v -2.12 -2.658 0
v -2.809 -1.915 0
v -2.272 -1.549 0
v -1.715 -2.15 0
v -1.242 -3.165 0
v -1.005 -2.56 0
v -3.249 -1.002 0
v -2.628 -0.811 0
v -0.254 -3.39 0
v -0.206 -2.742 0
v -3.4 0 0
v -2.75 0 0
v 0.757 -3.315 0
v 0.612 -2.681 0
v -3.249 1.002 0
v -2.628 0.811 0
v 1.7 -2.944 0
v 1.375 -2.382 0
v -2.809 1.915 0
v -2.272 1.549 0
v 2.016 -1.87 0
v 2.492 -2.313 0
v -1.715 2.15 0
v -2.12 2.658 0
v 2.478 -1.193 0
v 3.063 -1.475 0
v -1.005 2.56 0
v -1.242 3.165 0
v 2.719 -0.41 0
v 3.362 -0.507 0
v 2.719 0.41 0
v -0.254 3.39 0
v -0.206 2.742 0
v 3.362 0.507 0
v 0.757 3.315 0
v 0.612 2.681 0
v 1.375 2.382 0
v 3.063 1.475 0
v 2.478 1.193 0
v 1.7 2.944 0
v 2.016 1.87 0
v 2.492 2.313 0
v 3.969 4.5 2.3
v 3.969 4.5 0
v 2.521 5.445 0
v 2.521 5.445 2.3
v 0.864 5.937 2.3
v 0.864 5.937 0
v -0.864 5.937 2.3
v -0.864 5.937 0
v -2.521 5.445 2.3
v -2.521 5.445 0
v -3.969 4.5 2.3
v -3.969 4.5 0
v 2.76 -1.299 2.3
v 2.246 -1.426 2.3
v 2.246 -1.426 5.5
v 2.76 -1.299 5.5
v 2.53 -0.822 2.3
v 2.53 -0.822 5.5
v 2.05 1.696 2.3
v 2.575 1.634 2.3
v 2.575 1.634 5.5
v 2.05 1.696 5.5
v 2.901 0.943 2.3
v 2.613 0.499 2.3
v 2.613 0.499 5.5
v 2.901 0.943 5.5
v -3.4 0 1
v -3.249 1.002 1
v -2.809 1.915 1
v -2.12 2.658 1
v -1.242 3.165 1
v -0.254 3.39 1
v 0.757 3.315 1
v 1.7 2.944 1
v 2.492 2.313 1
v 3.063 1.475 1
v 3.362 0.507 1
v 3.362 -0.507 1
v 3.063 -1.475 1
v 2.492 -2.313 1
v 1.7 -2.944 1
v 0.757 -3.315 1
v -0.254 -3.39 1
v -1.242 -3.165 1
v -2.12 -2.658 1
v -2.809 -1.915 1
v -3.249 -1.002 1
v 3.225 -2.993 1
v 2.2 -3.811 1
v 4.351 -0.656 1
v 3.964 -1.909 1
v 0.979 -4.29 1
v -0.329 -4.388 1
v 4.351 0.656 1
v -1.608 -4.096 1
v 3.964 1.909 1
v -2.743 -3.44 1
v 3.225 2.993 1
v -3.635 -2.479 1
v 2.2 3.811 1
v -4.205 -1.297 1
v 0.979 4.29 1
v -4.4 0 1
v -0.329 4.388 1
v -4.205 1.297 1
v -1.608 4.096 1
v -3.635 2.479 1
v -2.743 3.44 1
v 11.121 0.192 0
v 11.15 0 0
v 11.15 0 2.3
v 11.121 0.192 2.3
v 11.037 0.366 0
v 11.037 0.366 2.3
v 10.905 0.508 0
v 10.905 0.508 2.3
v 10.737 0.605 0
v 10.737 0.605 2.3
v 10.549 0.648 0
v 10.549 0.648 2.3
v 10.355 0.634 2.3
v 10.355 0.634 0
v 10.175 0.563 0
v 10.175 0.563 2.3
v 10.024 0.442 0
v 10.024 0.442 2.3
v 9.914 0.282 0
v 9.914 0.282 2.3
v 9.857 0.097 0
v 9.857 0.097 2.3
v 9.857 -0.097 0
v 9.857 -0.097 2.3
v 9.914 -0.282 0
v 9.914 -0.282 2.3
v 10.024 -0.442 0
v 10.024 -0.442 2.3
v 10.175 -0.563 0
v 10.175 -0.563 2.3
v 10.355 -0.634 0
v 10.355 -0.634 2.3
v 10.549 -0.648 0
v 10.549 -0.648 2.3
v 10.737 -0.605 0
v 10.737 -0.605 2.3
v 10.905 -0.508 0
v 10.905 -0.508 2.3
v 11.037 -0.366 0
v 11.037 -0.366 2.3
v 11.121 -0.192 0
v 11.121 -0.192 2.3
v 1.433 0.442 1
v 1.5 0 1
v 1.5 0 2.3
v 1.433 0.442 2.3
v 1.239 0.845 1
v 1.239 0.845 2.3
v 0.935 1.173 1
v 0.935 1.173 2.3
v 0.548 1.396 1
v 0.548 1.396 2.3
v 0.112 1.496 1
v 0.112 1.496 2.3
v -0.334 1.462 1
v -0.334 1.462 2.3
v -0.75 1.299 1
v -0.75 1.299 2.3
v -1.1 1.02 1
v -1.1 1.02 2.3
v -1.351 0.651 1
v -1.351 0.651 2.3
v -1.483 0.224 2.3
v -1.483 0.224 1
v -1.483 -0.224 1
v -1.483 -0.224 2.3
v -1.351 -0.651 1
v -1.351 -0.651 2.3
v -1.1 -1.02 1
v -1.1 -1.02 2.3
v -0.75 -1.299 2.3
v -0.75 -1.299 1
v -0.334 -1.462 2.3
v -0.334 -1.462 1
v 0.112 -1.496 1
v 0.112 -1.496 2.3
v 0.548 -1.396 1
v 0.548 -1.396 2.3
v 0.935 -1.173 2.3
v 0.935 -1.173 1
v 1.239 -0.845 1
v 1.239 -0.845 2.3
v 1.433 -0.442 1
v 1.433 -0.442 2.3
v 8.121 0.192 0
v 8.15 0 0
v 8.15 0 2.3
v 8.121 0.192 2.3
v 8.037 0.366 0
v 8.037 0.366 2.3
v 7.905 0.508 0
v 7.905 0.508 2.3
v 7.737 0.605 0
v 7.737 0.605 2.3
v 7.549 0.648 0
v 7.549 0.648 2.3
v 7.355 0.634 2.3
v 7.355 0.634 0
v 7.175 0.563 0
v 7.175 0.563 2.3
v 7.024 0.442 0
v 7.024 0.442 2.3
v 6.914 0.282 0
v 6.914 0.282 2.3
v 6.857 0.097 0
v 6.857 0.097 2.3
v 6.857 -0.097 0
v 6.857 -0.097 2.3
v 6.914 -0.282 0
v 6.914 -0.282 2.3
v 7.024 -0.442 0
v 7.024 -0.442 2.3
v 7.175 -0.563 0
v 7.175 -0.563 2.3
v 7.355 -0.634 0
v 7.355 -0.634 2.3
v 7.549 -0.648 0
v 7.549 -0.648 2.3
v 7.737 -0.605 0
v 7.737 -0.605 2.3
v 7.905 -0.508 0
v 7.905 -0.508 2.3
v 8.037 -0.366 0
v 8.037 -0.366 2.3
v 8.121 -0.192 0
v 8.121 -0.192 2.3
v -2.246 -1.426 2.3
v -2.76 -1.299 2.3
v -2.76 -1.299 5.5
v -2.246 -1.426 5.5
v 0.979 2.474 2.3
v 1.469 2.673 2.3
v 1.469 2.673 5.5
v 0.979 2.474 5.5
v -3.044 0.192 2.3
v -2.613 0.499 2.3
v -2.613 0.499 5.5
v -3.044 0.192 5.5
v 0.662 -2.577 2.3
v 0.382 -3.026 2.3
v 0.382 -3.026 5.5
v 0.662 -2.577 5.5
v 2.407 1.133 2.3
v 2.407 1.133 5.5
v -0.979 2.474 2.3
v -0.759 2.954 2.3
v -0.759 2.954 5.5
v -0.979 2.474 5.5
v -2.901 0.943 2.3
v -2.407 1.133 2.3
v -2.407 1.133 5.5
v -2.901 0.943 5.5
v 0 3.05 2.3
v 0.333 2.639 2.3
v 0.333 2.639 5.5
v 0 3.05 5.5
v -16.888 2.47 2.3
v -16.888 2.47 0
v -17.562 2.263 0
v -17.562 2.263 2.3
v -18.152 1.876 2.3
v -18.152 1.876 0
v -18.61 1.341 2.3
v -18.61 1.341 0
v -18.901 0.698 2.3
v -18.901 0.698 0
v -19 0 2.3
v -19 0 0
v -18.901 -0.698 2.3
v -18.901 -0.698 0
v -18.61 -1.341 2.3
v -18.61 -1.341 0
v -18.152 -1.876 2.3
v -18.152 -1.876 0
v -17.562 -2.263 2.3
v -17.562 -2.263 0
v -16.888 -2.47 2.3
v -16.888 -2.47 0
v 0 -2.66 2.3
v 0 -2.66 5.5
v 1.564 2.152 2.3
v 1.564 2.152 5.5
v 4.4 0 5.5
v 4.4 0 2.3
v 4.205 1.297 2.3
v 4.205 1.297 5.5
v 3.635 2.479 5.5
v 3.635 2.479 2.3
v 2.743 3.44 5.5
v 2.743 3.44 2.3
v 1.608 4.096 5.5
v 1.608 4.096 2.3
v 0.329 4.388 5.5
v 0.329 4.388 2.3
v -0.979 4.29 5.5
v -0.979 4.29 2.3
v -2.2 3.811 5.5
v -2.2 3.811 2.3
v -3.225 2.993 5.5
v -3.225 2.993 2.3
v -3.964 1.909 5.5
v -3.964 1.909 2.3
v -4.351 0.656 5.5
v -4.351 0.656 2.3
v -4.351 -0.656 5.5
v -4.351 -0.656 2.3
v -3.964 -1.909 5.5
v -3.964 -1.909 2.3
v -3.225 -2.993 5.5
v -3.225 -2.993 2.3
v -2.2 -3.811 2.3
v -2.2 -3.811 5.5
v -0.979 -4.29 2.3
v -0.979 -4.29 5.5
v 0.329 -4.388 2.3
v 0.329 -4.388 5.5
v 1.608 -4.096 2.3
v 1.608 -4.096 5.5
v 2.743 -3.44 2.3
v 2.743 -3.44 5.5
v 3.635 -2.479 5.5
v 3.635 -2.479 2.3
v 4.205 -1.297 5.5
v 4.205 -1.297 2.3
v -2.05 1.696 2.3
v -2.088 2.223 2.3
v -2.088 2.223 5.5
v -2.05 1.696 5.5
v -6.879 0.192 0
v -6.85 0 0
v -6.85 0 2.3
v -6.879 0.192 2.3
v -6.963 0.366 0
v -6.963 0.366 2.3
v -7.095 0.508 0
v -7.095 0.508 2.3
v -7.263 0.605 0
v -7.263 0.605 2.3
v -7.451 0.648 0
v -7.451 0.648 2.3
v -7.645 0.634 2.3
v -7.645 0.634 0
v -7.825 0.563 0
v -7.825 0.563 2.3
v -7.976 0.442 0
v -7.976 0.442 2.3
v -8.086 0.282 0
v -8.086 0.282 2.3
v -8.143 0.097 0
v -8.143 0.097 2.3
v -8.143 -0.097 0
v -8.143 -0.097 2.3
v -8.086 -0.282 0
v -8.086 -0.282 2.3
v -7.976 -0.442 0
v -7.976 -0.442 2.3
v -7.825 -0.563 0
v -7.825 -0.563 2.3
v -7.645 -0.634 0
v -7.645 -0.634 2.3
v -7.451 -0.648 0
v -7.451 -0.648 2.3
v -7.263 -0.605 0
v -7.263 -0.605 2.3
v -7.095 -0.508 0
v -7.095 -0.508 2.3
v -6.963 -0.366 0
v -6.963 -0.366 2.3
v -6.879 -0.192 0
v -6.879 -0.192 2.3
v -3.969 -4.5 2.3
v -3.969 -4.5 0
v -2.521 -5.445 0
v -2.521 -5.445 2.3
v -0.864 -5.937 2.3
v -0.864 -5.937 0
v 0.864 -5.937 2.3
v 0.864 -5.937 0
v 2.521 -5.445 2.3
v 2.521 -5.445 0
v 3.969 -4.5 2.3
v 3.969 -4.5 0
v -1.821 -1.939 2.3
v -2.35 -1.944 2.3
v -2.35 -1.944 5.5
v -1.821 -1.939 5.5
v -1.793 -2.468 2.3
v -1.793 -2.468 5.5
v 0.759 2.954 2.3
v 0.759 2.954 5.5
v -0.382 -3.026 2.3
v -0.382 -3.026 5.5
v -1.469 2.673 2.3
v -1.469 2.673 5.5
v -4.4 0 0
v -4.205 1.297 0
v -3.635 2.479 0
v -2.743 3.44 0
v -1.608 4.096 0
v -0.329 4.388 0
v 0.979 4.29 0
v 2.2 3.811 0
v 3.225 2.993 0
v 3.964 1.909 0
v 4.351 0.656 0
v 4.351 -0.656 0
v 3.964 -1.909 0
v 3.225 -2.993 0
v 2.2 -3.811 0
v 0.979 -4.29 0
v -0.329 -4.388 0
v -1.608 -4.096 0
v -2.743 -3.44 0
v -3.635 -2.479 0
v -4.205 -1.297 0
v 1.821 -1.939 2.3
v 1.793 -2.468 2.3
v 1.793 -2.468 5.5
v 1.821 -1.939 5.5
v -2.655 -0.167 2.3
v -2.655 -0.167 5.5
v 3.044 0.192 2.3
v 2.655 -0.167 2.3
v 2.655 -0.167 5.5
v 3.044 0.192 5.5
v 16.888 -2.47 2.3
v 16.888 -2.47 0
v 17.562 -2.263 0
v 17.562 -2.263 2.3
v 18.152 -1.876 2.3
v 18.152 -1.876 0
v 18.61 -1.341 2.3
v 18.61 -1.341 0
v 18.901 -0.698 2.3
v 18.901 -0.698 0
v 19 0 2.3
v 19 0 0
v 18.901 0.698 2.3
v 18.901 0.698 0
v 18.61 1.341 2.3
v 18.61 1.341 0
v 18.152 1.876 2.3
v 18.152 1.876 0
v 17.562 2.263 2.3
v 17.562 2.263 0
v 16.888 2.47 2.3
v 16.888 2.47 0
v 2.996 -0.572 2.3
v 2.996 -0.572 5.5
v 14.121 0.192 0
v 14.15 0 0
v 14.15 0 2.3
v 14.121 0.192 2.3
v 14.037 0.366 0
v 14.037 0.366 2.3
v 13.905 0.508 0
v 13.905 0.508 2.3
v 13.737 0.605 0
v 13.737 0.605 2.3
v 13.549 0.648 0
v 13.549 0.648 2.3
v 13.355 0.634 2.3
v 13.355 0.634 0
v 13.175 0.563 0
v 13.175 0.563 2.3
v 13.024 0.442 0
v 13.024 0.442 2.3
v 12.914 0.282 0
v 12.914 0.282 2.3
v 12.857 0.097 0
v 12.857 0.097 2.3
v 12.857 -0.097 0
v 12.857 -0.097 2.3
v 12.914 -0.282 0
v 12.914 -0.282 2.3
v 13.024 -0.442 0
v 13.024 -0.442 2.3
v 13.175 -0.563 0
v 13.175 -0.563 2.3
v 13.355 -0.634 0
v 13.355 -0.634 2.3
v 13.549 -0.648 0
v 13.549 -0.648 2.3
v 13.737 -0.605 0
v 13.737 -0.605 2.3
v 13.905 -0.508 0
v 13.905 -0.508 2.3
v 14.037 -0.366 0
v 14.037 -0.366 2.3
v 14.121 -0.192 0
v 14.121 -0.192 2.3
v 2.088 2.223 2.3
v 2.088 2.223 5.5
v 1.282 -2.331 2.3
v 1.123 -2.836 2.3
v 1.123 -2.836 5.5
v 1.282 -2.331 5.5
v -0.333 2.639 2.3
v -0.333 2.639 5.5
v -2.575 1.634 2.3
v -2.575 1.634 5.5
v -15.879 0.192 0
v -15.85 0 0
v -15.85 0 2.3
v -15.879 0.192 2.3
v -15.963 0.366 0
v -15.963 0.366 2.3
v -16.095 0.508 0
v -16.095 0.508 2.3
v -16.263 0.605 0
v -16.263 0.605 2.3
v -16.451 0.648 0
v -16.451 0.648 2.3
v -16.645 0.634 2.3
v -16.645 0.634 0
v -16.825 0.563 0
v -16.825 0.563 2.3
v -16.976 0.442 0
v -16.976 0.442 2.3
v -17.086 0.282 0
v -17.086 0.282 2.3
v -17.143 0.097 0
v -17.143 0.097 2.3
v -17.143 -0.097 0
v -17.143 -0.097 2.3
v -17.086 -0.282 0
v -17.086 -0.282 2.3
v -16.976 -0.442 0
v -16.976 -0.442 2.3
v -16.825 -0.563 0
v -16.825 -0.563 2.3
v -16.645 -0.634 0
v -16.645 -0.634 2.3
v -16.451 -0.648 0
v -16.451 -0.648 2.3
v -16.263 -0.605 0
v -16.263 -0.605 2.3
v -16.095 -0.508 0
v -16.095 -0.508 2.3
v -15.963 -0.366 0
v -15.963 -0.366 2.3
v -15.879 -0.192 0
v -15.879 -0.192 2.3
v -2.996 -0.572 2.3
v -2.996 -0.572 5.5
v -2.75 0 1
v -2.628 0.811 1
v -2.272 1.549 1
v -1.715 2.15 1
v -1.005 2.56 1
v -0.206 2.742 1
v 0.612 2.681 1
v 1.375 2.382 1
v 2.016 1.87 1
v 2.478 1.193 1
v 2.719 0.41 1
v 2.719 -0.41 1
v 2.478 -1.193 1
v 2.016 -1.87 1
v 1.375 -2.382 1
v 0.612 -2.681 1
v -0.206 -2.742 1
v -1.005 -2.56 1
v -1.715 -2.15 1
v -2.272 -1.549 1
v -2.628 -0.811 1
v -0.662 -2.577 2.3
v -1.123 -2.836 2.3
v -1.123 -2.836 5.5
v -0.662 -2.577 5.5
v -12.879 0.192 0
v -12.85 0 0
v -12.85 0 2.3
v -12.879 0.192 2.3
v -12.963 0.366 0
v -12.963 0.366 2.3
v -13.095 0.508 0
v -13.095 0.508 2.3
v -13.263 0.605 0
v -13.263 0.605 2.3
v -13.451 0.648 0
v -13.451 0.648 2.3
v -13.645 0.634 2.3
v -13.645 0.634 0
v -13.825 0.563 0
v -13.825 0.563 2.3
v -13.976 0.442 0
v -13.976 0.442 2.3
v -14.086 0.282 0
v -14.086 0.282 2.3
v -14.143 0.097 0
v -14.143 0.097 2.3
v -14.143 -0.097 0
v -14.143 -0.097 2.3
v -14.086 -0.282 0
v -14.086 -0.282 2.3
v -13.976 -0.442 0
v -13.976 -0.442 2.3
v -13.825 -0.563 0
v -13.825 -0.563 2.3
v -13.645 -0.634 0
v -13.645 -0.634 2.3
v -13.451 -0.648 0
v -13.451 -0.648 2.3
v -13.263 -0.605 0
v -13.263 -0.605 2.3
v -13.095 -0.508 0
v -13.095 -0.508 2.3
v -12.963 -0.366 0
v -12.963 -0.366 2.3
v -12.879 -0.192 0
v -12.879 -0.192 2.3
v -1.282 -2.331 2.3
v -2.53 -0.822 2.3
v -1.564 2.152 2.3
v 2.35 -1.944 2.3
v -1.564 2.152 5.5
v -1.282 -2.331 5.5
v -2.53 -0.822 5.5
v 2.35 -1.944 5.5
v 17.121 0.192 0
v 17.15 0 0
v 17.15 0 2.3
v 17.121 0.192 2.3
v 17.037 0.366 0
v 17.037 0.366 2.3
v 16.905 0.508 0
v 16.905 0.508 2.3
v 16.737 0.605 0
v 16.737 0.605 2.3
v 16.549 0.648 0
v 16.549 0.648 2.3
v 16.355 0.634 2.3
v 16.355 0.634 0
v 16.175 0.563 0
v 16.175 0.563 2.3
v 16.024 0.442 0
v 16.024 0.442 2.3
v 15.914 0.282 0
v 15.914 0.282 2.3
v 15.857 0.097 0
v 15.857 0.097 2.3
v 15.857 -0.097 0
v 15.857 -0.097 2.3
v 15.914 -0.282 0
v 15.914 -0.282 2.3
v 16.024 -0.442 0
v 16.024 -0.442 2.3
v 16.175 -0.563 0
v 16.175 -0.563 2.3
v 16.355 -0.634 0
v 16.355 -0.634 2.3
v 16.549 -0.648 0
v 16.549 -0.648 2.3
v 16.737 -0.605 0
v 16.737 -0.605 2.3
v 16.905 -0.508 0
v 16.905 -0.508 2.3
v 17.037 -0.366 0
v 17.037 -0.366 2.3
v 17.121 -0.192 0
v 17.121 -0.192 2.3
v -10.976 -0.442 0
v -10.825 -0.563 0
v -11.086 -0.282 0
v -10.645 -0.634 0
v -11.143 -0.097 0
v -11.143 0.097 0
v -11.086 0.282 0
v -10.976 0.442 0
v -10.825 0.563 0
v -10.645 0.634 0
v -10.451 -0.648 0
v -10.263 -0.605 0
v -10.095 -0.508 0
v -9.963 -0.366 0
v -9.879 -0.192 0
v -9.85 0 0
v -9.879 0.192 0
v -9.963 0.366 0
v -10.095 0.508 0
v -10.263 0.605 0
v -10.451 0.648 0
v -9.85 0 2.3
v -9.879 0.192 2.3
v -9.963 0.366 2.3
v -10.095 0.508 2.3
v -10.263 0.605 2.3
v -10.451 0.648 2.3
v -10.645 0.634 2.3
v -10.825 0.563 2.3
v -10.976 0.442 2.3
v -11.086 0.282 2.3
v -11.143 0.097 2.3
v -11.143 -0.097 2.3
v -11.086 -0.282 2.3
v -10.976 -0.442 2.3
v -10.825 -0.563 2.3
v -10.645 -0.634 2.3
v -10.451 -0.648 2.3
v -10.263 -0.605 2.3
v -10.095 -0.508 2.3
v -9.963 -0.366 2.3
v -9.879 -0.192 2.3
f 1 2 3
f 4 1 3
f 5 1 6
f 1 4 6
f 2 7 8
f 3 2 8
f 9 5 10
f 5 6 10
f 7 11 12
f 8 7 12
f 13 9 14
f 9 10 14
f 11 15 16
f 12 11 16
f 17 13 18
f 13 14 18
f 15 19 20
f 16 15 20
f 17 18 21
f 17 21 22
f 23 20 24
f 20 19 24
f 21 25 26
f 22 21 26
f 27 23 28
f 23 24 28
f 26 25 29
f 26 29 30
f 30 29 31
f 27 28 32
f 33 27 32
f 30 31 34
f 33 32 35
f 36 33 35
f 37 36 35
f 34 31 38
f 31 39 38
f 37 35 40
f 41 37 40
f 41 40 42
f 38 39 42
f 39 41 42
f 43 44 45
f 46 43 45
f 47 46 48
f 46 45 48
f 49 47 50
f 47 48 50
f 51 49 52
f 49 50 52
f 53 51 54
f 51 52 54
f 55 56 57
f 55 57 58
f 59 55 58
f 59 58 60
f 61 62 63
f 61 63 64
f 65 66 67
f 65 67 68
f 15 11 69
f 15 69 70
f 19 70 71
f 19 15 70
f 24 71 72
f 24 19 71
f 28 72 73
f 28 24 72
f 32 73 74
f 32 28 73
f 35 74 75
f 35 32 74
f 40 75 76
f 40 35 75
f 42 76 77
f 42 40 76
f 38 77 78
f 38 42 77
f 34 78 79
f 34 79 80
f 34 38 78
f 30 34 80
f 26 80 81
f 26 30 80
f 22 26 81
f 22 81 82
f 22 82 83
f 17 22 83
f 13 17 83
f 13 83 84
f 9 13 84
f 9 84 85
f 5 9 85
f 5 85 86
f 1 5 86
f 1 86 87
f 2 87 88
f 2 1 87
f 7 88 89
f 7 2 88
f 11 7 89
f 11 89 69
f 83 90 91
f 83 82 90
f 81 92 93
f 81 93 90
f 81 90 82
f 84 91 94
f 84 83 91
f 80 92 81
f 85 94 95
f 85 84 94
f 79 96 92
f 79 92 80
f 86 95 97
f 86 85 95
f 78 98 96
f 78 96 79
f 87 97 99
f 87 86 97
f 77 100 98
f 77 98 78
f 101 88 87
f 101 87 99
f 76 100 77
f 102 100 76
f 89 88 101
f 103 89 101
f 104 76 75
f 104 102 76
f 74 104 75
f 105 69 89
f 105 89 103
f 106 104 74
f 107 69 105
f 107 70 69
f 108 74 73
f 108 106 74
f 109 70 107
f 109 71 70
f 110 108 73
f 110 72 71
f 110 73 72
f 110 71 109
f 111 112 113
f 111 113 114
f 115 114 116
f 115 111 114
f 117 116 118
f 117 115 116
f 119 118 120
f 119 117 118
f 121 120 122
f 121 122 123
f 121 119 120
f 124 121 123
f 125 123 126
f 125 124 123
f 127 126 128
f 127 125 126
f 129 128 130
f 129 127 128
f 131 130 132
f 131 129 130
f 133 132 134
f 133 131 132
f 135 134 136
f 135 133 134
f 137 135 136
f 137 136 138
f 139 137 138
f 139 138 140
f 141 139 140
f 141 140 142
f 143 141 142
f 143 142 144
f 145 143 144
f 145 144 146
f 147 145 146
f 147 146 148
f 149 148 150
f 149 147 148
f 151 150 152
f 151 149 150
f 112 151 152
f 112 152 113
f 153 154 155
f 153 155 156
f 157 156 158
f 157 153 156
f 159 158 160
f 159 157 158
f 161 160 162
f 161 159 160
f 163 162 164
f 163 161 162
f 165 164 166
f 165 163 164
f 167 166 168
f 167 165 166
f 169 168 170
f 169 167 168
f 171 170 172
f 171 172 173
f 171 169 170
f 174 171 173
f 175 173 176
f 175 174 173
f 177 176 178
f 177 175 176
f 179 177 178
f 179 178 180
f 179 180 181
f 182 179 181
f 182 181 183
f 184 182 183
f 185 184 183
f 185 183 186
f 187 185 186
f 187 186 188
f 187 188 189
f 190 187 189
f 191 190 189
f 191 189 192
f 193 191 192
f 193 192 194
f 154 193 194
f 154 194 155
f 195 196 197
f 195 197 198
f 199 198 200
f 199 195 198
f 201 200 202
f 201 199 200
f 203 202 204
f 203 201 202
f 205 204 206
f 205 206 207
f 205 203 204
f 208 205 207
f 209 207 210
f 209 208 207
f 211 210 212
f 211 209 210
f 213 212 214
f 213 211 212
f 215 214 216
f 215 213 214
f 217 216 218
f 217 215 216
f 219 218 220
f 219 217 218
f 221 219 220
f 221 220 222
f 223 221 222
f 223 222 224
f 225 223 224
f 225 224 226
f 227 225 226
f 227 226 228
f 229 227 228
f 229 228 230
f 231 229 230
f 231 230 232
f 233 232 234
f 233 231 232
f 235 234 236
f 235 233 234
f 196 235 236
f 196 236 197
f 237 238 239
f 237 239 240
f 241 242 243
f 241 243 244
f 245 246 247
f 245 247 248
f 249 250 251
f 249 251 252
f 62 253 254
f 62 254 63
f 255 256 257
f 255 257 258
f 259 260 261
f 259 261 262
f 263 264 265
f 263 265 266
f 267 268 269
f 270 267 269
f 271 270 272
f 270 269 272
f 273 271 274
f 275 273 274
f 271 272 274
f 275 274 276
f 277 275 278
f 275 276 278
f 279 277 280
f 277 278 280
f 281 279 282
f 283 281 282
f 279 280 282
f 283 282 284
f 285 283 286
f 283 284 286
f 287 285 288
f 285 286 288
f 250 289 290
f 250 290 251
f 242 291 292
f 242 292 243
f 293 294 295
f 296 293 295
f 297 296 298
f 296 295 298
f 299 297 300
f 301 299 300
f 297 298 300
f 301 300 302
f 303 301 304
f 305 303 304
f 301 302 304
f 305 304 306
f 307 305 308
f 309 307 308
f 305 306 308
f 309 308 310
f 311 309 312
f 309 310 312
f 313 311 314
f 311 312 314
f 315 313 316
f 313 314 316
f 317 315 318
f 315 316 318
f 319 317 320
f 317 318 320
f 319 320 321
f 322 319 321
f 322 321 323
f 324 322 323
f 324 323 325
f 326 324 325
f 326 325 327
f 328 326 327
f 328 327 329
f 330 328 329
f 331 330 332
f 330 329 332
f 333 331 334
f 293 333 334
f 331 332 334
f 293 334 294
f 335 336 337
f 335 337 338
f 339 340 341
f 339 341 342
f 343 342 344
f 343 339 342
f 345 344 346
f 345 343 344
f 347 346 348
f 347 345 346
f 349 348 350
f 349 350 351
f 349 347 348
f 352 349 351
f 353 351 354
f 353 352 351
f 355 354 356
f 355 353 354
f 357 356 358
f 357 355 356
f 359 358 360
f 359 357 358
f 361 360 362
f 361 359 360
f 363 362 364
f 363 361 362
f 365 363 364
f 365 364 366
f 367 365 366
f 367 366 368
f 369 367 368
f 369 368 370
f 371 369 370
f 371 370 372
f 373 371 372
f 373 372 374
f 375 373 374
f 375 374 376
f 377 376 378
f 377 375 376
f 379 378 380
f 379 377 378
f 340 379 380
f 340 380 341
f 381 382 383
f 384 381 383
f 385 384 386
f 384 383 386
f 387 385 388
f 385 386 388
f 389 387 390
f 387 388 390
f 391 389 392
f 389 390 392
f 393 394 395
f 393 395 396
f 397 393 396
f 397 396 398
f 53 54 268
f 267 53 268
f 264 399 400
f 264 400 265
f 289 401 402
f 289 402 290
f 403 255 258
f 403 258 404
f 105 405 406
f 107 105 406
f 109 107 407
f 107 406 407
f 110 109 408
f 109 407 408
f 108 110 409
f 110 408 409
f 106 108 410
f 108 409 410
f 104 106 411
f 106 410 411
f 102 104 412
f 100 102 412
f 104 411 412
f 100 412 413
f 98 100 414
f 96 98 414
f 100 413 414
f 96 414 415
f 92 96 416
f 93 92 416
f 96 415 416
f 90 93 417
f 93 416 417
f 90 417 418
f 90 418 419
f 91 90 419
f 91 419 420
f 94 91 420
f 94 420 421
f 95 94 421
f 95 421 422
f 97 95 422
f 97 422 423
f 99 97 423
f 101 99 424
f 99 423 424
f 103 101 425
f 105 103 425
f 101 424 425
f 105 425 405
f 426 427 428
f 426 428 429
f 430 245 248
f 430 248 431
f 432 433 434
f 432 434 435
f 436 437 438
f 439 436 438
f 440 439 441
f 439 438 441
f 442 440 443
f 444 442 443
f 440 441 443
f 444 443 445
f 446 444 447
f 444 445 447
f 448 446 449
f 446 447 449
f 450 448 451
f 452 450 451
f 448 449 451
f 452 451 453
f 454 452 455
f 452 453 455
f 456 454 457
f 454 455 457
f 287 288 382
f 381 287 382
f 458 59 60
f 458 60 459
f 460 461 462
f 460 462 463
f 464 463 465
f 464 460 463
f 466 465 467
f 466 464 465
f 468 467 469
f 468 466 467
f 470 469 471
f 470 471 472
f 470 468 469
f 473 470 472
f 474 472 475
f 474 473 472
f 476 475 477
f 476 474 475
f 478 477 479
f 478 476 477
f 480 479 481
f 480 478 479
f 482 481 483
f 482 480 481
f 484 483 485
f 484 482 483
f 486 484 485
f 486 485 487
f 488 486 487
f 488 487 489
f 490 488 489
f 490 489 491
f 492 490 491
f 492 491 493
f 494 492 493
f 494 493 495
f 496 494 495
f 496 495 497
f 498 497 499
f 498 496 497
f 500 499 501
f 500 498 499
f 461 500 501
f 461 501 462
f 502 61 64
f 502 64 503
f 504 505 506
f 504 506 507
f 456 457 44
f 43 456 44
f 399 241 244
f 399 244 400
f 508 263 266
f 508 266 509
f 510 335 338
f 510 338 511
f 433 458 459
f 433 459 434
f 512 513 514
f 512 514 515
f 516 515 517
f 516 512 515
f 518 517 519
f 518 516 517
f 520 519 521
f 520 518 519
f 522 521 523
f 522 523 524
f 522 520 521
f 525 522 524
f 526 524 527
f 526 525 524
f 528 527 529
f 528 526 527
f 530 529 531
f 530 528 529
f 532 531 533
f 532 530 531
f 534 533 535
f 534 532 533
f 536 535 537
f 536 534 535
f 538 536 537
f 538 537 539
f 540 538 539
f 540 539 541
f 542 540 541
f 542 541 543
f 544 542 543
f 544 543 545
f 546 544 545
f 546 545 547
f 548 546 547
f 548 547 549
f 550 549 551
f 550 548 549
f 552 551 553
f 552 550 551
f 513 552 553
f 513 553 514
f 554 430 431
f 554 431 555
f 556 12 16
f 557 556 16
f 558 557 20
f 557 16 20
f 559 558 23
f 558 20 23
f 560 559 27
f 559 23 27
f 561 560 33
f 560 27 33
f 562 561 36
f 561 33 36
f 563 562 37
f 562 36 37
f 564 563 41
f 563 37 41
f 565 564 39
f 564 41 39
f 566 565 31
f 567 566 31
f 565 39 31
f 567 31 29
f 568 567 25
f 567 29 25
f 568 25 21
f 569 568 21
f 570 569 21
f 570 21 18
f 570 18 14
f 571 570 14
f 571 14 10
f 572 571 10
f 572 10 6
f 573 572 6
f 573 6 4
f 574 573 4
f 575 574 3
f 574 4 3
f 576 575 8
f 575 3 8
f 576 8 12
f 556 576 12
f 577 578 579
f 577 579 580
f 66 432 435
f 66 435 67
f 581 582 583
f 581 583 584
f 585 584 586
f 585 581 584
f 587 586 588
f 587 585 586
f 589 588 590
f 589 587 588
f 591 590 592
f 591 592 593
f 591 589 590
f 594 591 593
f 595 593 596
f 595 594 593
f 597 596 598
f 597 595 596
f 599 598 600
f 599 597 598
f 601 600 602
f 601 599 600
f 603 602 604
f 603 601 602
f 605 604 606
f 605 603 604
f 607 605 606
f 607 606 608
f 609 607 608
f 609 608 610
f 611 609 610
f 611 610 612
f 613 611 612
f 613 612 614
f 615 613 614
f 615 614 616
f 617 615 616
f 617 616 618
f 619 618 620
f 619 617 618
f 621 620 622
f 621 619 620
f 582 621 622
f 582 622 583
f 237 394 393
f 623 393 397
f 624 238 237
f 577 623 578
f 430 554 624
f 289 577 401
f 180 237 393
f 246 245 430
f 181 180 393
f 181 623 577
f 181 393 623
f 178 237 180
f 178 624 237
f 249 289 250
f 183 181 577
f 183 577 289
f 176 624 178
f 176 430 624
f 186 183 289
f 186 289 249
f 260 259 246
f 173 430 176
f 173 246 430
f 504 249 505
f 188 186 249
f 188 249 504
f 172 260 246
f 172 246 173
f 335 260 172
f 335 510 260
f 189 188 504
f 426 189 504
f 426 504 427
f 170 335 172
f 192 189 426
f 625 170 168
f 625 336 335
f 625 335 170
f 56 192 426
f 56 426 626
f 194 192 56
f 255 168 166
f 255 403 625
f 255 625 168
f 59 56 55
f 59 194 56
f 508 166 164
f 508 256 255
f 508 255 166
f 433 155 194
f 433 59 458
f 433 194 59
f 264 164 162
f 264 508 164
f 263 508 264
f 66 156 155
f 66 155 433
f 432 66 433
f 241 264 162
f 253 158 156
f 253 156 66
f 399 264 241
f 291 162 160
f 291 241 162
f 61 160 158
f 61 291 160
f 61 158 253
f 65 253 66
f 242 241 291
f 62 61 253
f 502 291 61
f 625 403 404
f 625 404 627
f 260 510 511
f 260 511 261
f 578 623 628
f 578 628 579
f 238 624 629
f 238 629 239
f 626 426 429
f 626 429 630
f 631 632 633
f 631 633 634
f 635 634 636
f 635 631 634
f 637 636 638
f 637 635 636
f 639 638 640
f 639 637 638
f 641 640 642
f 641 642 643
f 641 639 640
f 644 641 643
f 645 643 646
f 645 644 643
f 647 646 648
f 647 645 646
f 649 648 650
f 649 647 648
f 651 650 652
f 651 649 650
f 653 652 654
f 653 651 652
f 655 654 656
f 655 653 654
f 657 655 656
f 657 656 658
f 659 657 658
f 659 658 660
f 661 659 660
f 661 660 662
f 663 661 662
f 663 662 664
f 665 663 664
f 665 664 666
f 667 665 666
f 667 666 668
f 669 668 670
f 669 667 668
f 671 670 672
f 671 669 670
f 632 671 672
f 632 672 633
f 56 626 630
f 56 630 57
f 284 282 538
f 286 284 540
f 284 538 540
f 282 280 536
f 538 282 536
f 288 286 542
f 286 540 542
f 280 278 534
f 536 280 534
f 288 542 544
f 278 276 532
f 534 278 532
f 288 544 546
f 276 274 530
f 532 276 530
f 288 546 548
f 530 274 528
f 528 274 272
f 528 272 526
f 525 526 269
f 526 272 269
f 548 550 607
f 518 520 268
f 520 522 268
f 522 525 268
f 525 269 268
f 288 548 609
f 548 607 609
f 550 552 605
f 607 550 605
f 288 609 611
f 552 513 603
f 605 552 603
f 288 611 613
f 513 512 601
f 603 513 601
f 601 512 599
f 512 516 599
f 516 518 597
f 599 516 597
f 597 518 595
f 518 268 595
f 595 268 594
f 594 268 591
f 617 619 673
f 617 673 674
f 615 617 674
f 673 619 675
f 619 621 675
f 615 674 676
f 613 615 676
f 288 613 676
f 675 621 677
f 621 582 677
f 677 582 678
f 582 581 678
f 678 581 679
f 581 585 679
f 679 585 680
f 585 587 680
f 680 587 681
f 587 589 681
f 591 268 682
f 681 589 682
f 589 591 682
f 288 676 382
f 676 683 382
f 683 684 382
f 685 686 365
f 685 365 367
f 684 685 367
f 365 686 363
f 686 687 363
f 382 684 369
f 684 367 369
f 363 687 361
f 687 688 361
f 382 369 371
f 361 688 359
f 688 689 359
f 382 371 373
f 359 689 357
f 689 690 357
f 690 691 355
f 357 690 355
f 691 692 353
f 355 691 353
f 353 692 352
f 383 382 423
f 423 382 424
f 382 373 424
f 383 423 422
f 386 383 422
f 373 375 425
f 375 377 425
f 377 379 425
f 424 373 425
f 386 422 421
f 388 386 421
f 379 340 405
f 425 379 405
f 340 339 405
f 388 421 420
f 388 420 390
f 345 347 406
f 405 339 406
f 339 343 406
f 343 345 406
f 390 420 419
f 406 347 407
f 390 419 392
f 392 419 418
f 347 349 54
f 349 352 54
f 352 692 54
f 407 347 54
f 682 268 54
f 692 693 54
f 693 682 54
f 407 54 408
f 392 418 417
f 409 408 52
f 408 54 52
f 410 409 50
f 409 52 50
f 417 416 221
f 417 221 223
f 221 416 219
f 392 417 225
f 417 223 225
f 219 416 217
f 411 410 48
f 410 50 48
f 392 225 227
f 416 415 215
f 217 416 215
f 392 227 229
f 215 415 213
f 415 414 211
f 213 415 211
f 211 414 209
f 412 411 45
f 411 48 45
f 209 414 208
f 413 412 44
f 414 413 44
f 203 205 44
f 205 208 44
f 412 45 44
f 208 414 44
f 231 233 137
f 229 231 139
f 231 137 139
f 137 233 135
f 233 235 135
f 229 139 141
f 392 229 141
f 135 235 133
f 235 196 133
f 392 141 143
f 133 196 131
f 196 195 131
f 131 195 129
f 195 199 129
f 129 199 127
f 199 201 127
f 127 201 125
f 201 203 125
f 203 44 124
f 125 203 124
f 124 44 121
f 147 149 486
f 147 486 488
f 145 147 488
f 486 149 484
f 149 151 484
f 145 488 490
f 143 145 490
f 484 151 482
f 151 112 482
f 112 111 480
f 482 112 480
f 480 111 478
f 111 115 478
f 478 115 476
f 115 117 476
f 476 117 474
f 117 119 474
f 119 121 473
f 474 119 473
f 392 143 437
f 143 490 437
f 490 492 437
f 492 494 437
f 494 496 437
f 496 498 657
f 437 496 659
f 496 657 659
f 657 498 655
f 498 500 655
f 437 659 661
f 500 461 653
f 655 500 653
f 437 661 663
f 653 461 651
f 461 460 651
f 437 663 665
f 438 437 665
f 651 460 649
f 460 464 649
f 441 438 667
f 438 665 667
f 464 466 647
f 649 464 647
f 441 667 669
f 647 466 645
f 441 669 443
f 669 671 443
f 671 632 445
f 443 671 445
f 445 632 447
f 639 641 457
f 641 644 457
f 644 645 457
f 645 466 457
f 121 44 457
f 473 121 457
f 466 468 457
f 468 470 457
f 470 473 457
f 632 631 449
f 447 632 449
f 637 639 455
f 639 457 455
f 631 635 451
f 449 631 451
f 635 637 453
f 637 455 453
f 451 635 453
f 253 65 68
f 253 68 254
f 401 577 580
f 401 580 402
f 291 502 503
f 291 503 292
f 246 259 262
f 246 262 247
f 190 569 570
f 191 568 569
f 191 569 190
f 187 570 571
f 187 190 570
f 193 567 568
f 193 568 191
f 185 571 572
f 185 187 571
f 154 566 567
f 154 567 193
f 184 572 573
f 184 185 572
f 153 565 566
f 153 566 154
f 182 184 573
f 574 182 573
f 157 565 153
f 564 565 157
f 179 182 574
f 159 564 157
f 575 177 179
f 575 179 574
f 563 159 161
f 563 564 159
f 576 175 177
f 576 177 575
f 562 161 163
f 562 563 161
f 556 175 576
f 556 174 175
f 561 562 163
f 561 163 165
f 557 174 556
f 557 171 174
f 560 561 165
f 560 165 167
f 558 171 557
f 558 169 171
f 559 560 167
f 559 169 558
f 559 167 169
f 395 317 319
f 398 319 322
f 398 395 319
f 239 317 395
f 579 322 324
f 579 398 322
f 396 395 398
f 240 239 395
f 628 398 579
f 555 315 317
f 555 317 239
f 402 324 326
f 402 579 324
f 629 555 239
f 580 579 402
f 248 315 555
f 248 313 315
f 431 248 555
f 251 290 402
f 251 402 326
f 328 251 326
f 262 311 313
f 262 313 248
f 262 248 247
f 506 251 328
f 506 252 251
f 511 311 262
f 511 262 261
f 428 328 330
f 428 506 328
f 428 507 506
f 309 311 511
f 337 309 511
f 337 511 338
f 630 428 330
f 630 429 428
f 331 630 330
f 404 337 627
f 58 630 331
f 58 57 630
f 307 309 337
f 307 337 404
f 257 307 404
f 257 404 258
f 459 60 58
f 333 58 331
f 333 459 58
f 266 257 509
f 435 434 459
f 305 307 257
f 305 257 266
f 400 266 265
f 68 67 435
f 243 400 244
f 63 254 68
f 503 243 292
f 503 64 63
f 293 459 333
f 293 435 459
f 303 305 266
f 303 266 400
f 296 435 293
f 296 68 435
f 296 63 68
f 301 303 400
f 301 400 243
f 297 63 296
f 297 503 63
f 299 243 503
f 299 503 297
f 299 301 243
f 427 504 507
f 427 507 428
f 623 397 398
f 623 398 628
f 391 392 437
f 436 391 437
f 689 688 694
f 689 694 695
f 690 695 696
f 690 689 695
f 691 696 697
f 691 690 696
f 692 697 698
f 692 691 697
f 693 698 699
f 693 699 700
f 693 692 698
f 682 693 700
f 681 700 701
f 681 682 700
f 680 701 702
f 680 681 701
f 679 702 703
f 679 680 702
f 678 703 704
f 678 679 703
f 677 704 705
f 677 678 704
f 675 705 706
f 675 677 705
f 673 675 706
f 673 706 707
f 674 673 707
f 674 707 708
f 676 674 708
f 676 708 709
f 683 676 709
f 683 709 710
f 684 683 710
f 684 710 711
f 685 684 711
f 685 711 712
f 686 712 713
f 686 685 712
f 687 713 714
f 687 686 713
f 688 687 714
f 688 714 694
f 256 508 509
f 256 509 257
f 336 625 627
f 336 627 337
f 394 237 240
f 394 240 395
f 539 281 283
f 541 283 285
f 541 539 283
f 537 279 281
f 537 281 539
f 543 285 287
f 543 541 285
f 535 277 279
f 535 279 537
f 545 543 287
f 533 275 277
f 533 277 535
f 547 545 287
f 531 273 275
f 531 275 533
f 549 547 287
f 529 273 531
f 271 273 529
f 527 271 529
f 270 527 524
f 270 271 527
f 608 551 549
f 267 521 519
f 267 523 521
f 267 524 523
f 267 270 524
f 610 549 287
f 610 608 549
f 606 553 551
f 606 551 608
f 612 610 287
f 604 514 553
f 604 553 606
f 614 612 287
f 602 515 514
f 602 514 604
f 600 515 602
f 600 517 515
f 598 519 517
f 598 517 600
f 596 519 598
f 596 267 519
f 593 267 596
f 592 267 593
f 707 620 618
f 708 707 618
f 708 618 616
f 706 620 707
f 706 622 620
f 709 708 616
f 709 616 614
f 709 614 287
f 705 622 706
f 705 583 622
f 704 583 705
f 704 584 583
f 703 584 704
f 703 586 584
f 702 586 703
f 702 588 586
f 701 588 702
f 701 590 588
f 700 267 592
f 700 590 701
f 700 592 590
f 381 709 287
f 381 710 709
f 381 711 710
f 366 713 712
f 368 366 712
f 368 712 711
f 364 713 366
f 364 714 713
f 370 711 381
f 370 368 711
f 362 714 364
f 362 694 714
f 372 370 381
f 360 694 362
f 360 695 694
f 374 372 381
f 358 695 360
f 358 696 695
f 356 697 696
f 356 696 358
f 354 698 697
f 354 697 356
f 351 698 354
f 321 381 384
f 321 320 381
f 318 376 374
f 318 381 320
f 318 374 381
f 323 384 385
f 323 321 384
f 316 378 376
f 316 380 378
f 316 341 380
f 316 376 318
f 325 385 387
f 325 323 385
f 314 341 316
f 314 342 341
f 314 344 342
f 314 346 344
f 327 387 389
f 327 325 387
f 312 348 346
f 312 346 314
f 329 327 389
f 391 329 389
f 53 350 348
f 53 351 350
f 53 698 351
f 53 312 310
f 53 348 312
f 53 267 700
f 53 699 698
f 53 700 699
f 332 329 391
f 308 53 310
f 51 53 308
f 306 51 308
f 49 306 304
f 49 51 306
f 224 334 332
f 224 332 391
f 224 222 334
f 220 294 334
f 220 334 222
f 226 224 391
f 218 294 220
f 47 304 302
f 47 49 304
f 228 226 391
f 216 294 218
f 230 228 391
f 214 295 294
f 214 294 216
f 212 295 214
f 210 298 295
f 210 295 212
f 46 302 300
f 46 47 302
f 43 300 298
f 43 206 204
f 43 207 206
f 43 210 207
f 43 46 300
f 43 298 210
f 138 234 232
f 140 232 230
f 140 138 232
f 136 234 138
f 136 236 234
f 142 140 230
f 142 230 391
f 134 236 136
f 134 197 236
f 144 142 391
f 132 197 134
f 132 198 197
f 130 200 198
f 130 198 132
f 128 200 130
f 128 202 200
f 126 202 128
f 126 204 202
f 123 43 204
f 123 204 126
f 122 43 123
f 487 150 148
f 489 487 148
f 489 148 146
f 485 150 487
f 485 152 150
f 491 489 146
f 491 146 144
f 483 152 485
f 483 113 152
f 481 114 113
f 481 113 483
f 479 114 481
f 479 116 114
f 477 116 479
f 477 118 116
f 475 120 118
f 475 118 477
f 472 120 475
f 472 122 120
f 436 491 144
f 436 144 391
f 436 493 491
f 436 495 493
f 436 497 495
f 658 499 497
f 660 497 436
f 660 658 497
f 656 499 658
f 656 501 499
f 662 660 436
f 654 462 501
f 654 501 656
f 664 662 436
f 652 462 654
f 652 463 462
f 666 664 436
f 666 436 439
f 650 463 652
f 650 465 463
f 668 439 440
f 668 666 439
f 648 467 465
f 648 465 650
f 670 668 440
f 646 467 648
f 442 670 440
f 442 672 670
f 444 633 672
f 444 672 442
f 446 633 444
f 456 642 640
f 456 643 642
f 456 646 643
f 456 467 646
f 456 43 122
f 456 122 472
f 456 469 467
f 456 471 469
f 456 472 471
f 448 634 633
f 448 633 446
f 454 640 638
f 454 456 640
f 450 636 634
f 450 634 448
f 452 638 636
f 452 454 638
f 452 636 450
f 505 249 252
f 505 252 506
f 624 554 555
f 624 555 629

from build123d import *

# Parameters (mm, degrees)
SKETCH_1_R          = 0.65
SKETCH_1_R_2        = 1.5
EXTRUDE_1_DEPTH     = 2.3
SKETCH_2_R          = 4.4
EXTRUDE_2_DEPTH     = 3.2
SKETCH_3_R          = 4.4
SKETCH_3_R_2        = 3.4
SKETCH_3_R_3        = 2.75
SKETCH_3_R_4        = 1.5
CUT_EXTRUDE_1_DEPTH = 1


with BuildPart() as part:
    # Эскиз1 → Бобышка-Вытянуть1 (new body)
    with BuildSketch(Plane.XY):
        with BuildLine():
            Line((-3.968626967, 4.5), (-16.888114198, 2.469689731))
            ThreePointArc((-16.888114198, 2.469689731), (-19, 0), (-16.888114198, -2.469689731))
            Line((-16.888114198, -2.469689731), (-3.968626967, -4.5))
            ThreePointArc((-3.968626967, -4.5), (0, -6), (3.968626967, -4.5))
            Line((3.968626967, -4.5), (16.888114198, -2.469689731))
            ThreePointArc((16.888114198, -2.469689731), (19, 0), (16.888114198, 2.469689731))
            Line((16.888114198, 2.469689731), (3.968626967, 4.5))
            ThreePointArc((3.968626967, 4.5), (0, 6), (-3.968626967, 4.5))
        make_face()
        with Locations((-16.5, 0)):
            Circle(SKETCH_1_R, mode=Mode.SUBTRACT)
        with Locations((-13.5, 0)):
            Circle(SKETCH_1_R, mode=Mode.SUBTRACT)
        with Locations((-10.5, 0)):
            Circle(SKETCH_1_R, mode=Mode.SUBTRACT)
        with Locations((-7.5, 0)):
            Circle(SKETCH_1_R, mode=Mode.SUBTRACT)
        with Locations((16.5, 0)):
            Circle(SKETCH_1_R, mode=Mode.SUBTRACT)
        with Locations((7.5, 0)):
            Circle(SKETCH_1_R, mode=Mode.SUBTRACT)
        with Locations((10.5, 0)):
            Circle(SKETCH_1_R, mode=Mode.SUBTRACT)
        with Locations((13.5, 0)):
            Circle(SKETCH_1_R, mode=Mode.SUBTRACT)
        Circle(SKETCH_1_R_2, mode=Mode.SUBTRACT)
    extrude(amount=EXTRUDE_1_DEPTH)

    # Эскиз2 → Бобышка-Вытянуть2 (add)
    with BuildSketch(Plane.XY.offset(2.3)):
        Circle(SKETCH_2_R)
        Polygon((0.333439775, 2.639447604), (0, 3.05), (-0.333439775, 2.639447604), (-0.758504156, 2.954178641), (-0.979368078, 2.473601404), (-1.469348706, 2.672735374), (-1.563759083, 2.15232973), (-2.087868673, 2.223354314), (-2.049893354, 1.695819264), (-2.575200173, 1.634271725), (-2.407225286, 1.132754236), (-2.900722375, 0.942501833), (-2.6133024, 0.498514094), (-3.043981522, 0.191511085), (-2.655176114, -0.167049522), (-2.995976115, -0.571513009), (-2.530215347, -0.822116802), (-2.75972251, -1.298626839), (-2.246271844, -1.42552746), (-2.35006539, -1.944143169), (-1.821186821, -1.939366985), (-1.792745019, -2.467501833), (-1.281669931, -2.33134895), (-1.122779886, -2.835818282), (-0.661621006, -2.576843686), (-0.382266362, -3.025949839), (0, -2.660425857), (0.382266362, -3.025949839), (0.661621006, -2.576843686), (1.122779886, -2.835818282), (1.281669931, -2.33134895), (1.792745019, -2.467501833), (1.821186821, -1.939366985), (2.35006539, -1.944143169), (2.246271844, -1.42552746), (2.75972251, -1.298626839), (2.530215347, -0.822116802), (2.995976115, -0.571513009), (2.655176114, -0.167049522), (3.043981522, 0.191511085), (2.6133024, 0.498514094), (2.900722375, 0.942501833), (2.407225286, 1.132754236), (2.575200173, 1.634271725), (2.049893354, 1.695819264), (2.087868673, 2.223354314), (1.563759083, 2.15232973), (1.469348706, 2.672735374), (0.979368078, 2.473601404), (0.758504156, 2.954178641), align=None, mode=Mode.SUBTRACT)
    extrude(amount=EXTRUDE_2_DEPTH)

    # Эскиз3 → Вырез-Вытянуть1 (cut)
    with BuildSketch(Plane(origin=(0, 0, 0), x_dir=(-1, 0, 0), z_dir=(0, 0, -1))):
        Circle(SKETCH_3_R)
        Circle(SKETCH_3_R_2, mode=Mode.SUBTRACT)
        Circle(SKETCH_3_R_3)
        Circle(SKETCH_3_R_4, mode=Mode.SUBTRACT)
    extrude(amount=-CUT_EXTRUDE_1_DEPTH, mode=Mode.SUBTRACT)


solid = part.part
